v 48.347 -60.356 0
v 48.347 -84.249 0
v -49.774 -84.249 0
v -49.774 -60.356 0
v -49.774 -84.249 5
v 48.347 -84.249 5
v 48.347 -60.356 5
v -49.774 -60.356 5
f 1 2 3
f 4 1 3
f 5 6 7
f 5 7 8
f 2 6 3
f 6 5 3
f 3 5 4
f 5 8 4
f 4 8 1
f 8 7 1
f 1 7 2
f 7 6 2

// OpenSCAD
// Module names are of the form poly_<inkscape-path-id>().  As a result,
// you can associate a polygon in this OpenSCAD program with the corresponding
// SVG element in the Inkscape document by looking for the XML element with
// the attribute id="inkscape-path-id".

// fudge value is used to ensure that subtracted solids are a tad taller
// in the z dimension than the polygon being subtracted from.  This helps
// keep the resulting .stl file manifold.
fudge = 0.1;

module poly_path3337(h)
{
  scale([25.4/90, -25.4/90, 1]) union()
  {
    difference()
    {
       linear_extrude(height=h)
         polygon([[103.396500,47.615000],[103.874500,53.378000],[103.696060,56.911918],[103.172320,60.343717],[102.320655,63.656029],[101.158438,66.831484],[99.703040,69.852716],[97.971836,72.702354],[95.982198,75.363030],[93.751500,77.817375],[91.297114,80.048021],[88.636414,82.037600],[85.786772,83.768741],[82.765563,85.224078],[79.590157,86.386241],[76.277930,87.237861],[72.846253,87.761571],[69.312500,87.940000],[64.431291,87.598020],[59.759953,86.603094],[55.345045,85.001746],[51.233125,82.840500],[47.470752,80.165879],[44.104484,77.024406],[41.180881,73.462605],[38.746500,69.527000],[-45.773500,69.527000],[-45.773500,87.582000],[-68.010500,87.582000],[-68.010500,69.481000],[-69.909734,68.841953],[-71.565875,67.598125],[-72.775578,65.935984],[-73.335500,64.042000],[-78.083500,8.855000],[-195.884500,128.848000],[-202.926500,121.928000],[-79.188500,-3.990000],[-92.527500,-159.059000],[-210.243500,-283.234000],[-210.243500,-296.909000],[-93.840500,-174.317000],[-96.907500,-209.971000],[-111.363500,-209.971000],[-111.363500,-221.971000],[-98.644500,-221.971000],[-97.754500,-224.313000],[-95.961930,-227.849488],[-93.774063,-231.133719],[-91.218039,-234.174715],[-88.321000,-236.981500],[-85.110086,-239.563098],[-81.612438,-241.928531],[-73.865500,-246.047000],[-73.865500,-253.978000],[-53.360500,-253.978000],[-53.360500,-252.751000],[-45.255156,-254.389484],[-37.050250,-255.651375],[-20.861500,-257.219000],[-20.861500,-261.971000],[38.137500,-261.971000],[38.137500,-232.470000],[-20.861500,-232.470000],[-20.861500,-244.932000],[-37.088125,-243.222500],[-45.317453,-241.904062],[-53.360500,-240.223000],[-53.360500,-221.971000],[86.083500,-221.971000],[84.876163,-224.312408],[83.321664,-226.498111],[81.443271,-228.533325],[79.264250,-230.423266],[74.097398,-233.788193],[68.007250,-236.634625],[61.179945,-239.004291],[53.801625,-240.938922],[46.058430,-242.480248],[38.136500,-243.670000],[38.136500,-255.889000],[46.119994,-254.737861],[54.024516,-253.234141],[61.715498,-251.335756],[69.058375,-249.000625],[75.918580,-246.186666],[82.161547,-242.851797],[87.652709,-238.953936],[92.257500,-234.451000],[94.741766,-236.981203],[97.734625,-238.911875],[101.136422,-240.143359],[104.847500,-240.576000],[108.072186,-240.250955],[111.075609,-239.318703],[113.793447,-237.843568],[116.161375,-235.889875],[118.115068,-233.521947],[119.590203,-230.804109],[120.522455,-227.800686],[120.847500,-224.576000],[120.522455,-221.351602],[119.590203,-218.348312],[118.115068,-215.630492],[116.161375,-213.262500],[113.793447,-211.308695],[111.075609,-209.833438],[108.072186,-208.901086],[104.847500,-208.576000],[101.635500,-208.898500],[98.642500,-209.824000],[96.917500,-191.324000],[104.903500,-191.324000],[210.243500,-298.520000],[210.243500,-284.838000],[118.438500,-191.325000],[120.349500,-191.325000],[120.349500,-149.483000],[93.018500,-149.483000],[78.424500,7.105000],[186.379500,120.800000],[179.217500,127.597000],[103.396500,47.615000]]);
       translate([0, 0, -fudge])
         linear_extrude(height=h+2*fudge)
           polygon([[26.135500,-249.972000],[-8.863500,-249.972000],[-8.863500,-244.470000],[26.135500,-244.470000],[26.135500,-249.972000]]);
       translate([0, 0, -fudge])
         linear_extrude(height=h+2*fudge)
           polygon([[-73.866500,-232.891000],[-77.691016,-230.560250],[-80.999625,-227.972250],[-83.728672,-225.113875],[-85.814500,-221.972000],[-73.866500,-221.972000],[-73.866500,-232.891000]]);
       translate([0, 0, -fudge])
         linear_extrude(height=h+2*fudge)
           polygon([[107.844500,-180.533000],[94.659500,-167.103000],[94.022500,-160.273000],[109.847500,-160.273000],[109.847500,-180.533000],[107.844500,-180.533000]]);
       translate([0, 0, -fudge])
         linear_extrude(height=h+2*fudge)
           polygon([[-11.155500,-73.222000],[-79.281500,-145.086000],[-68.113500,-15.260000],[-11.155500,-73.222000]]);
       translate([0, 0, -fudge])
         linear_extrude(height=h+2*fudge)
           polygon([[2.319500,-73.045000],[67.448500,-4.453000],[80.964500,-149.483000],[79.631500,-149.483000],[79.631500,-151.797000],[2.319500,-73.045000]]);
       translate([0, 0, -fudge])
         linear_extrude(height=h+2*fudge)
           polygon([[-80.596500,-160.369000],[-4.388500,-80.109000],[40.688500,-125.979000],[-22.863500,-125.979000],[-22.863500,-149.979000],[50.637500,-149.979000],[50.637500,-136.104000],[79.631500,-165.608000],[79.631500,-191.323000],[84.863500,-191.323000],[86.554500,-209.474000],[-84.820500,-209.474000],[-80.596500,-160.369000]]);
       translate([0, 0, -fudge])
         linear_extrude(height=h+2*fudge)
           polygon([[34.748500,53.378000],[34.902407,50.094683],[35.354869,46.898242],[37.099891,40.821563],[39.872436,35.259102],[43.561375,30.322000],[48.055580,26.121398],[53.243922,22.768438],[59.015271,20.374258],[62.084846,19.571442],[65.258500,19.050000],[66.248500,8.429000],[-4.450500,-66.149000],[-67.010500,-2.425000],[-61.853500,57.528000],[34.994500,57.528000],[34.748500,53.378000]]);
       translate([0, 0, -fudge])
         linear_extrude(height=h+2*fudge)
           polygon([[51.336500,53.378000],[51.701660,57.000498],[52.748969,60.374547],[54.406168,63.427854],[56.601000,66.088125],[59.261207,68.283068],[62.314531,69.940391],[65.688715,70.987799],[69.311500,71.353000],[72.933998,70.987799],[76.308047,69.940391],[79.361354,68.283068],[82.021625,66.088125],[84.216568,63.427854],[85.873891,60.374547],[86.921299,57.000498],[87.286500,53.378000],[86.921299,49.755215],[85.873891,46.381031],[84.216568,43.327707],[82.021625,40.667500],[79.361354,38.472668],[76.308047,36.815469],[72.933998,35.768160],[69.311500,35.403000],[65.688715,35.768160],[62.314531,36.815469],[59.261207,38.472668],[56.601000,40.667500],[54.406168,43.327707],[52.748969,46.381031],[51.701660,49.755215],[51.336500,53.378000]]);
       translate([0, 0, -fudge])
         linear_extrude(height=h+2*fudge)
           polygon([[57.637500,53.378000],[57.874689,51.025389],[58.554953,48.834109],[59.631334,46.851119],[61.056875,45.123375],[62.784619,43.697834],[64.767609,42.621453],[66.958889,41.941189],[69.311500,41.704000],[71.664111,41.941189],[73.855391,42.621453],[75.838381,43.697834],[77.566125,45.123375],[78.991666,46.851119],[80.068047,48.834109],[80.748311,51.025389],[80.985500,53.378000],[80.748311,55.730568],[80.068047,57.921734],[78.991666,59.904564],[77.566125,61.632125],[75.838381,63.057482],[73.855391,64.133703],[71.664111,64.813854],[69.311500,65.051000],[66.958889,64.813854],[64.767609,64.133703],[62.784619,63.057482],[61.056875,61.632125],[59.631334,59.904564],[58.554953,57.921734],[57.874689,55.730568],[57.637500,53.378000]]);
    }
    linear_extrude(height=h)
      polygon([[-176.365500,213.859000],[171.307500,213.859000],[171.307500,298.520000],[-176.365500,298.520000],[-176.365500,213.859000]]);
  }
}

poly_path3337(5);
